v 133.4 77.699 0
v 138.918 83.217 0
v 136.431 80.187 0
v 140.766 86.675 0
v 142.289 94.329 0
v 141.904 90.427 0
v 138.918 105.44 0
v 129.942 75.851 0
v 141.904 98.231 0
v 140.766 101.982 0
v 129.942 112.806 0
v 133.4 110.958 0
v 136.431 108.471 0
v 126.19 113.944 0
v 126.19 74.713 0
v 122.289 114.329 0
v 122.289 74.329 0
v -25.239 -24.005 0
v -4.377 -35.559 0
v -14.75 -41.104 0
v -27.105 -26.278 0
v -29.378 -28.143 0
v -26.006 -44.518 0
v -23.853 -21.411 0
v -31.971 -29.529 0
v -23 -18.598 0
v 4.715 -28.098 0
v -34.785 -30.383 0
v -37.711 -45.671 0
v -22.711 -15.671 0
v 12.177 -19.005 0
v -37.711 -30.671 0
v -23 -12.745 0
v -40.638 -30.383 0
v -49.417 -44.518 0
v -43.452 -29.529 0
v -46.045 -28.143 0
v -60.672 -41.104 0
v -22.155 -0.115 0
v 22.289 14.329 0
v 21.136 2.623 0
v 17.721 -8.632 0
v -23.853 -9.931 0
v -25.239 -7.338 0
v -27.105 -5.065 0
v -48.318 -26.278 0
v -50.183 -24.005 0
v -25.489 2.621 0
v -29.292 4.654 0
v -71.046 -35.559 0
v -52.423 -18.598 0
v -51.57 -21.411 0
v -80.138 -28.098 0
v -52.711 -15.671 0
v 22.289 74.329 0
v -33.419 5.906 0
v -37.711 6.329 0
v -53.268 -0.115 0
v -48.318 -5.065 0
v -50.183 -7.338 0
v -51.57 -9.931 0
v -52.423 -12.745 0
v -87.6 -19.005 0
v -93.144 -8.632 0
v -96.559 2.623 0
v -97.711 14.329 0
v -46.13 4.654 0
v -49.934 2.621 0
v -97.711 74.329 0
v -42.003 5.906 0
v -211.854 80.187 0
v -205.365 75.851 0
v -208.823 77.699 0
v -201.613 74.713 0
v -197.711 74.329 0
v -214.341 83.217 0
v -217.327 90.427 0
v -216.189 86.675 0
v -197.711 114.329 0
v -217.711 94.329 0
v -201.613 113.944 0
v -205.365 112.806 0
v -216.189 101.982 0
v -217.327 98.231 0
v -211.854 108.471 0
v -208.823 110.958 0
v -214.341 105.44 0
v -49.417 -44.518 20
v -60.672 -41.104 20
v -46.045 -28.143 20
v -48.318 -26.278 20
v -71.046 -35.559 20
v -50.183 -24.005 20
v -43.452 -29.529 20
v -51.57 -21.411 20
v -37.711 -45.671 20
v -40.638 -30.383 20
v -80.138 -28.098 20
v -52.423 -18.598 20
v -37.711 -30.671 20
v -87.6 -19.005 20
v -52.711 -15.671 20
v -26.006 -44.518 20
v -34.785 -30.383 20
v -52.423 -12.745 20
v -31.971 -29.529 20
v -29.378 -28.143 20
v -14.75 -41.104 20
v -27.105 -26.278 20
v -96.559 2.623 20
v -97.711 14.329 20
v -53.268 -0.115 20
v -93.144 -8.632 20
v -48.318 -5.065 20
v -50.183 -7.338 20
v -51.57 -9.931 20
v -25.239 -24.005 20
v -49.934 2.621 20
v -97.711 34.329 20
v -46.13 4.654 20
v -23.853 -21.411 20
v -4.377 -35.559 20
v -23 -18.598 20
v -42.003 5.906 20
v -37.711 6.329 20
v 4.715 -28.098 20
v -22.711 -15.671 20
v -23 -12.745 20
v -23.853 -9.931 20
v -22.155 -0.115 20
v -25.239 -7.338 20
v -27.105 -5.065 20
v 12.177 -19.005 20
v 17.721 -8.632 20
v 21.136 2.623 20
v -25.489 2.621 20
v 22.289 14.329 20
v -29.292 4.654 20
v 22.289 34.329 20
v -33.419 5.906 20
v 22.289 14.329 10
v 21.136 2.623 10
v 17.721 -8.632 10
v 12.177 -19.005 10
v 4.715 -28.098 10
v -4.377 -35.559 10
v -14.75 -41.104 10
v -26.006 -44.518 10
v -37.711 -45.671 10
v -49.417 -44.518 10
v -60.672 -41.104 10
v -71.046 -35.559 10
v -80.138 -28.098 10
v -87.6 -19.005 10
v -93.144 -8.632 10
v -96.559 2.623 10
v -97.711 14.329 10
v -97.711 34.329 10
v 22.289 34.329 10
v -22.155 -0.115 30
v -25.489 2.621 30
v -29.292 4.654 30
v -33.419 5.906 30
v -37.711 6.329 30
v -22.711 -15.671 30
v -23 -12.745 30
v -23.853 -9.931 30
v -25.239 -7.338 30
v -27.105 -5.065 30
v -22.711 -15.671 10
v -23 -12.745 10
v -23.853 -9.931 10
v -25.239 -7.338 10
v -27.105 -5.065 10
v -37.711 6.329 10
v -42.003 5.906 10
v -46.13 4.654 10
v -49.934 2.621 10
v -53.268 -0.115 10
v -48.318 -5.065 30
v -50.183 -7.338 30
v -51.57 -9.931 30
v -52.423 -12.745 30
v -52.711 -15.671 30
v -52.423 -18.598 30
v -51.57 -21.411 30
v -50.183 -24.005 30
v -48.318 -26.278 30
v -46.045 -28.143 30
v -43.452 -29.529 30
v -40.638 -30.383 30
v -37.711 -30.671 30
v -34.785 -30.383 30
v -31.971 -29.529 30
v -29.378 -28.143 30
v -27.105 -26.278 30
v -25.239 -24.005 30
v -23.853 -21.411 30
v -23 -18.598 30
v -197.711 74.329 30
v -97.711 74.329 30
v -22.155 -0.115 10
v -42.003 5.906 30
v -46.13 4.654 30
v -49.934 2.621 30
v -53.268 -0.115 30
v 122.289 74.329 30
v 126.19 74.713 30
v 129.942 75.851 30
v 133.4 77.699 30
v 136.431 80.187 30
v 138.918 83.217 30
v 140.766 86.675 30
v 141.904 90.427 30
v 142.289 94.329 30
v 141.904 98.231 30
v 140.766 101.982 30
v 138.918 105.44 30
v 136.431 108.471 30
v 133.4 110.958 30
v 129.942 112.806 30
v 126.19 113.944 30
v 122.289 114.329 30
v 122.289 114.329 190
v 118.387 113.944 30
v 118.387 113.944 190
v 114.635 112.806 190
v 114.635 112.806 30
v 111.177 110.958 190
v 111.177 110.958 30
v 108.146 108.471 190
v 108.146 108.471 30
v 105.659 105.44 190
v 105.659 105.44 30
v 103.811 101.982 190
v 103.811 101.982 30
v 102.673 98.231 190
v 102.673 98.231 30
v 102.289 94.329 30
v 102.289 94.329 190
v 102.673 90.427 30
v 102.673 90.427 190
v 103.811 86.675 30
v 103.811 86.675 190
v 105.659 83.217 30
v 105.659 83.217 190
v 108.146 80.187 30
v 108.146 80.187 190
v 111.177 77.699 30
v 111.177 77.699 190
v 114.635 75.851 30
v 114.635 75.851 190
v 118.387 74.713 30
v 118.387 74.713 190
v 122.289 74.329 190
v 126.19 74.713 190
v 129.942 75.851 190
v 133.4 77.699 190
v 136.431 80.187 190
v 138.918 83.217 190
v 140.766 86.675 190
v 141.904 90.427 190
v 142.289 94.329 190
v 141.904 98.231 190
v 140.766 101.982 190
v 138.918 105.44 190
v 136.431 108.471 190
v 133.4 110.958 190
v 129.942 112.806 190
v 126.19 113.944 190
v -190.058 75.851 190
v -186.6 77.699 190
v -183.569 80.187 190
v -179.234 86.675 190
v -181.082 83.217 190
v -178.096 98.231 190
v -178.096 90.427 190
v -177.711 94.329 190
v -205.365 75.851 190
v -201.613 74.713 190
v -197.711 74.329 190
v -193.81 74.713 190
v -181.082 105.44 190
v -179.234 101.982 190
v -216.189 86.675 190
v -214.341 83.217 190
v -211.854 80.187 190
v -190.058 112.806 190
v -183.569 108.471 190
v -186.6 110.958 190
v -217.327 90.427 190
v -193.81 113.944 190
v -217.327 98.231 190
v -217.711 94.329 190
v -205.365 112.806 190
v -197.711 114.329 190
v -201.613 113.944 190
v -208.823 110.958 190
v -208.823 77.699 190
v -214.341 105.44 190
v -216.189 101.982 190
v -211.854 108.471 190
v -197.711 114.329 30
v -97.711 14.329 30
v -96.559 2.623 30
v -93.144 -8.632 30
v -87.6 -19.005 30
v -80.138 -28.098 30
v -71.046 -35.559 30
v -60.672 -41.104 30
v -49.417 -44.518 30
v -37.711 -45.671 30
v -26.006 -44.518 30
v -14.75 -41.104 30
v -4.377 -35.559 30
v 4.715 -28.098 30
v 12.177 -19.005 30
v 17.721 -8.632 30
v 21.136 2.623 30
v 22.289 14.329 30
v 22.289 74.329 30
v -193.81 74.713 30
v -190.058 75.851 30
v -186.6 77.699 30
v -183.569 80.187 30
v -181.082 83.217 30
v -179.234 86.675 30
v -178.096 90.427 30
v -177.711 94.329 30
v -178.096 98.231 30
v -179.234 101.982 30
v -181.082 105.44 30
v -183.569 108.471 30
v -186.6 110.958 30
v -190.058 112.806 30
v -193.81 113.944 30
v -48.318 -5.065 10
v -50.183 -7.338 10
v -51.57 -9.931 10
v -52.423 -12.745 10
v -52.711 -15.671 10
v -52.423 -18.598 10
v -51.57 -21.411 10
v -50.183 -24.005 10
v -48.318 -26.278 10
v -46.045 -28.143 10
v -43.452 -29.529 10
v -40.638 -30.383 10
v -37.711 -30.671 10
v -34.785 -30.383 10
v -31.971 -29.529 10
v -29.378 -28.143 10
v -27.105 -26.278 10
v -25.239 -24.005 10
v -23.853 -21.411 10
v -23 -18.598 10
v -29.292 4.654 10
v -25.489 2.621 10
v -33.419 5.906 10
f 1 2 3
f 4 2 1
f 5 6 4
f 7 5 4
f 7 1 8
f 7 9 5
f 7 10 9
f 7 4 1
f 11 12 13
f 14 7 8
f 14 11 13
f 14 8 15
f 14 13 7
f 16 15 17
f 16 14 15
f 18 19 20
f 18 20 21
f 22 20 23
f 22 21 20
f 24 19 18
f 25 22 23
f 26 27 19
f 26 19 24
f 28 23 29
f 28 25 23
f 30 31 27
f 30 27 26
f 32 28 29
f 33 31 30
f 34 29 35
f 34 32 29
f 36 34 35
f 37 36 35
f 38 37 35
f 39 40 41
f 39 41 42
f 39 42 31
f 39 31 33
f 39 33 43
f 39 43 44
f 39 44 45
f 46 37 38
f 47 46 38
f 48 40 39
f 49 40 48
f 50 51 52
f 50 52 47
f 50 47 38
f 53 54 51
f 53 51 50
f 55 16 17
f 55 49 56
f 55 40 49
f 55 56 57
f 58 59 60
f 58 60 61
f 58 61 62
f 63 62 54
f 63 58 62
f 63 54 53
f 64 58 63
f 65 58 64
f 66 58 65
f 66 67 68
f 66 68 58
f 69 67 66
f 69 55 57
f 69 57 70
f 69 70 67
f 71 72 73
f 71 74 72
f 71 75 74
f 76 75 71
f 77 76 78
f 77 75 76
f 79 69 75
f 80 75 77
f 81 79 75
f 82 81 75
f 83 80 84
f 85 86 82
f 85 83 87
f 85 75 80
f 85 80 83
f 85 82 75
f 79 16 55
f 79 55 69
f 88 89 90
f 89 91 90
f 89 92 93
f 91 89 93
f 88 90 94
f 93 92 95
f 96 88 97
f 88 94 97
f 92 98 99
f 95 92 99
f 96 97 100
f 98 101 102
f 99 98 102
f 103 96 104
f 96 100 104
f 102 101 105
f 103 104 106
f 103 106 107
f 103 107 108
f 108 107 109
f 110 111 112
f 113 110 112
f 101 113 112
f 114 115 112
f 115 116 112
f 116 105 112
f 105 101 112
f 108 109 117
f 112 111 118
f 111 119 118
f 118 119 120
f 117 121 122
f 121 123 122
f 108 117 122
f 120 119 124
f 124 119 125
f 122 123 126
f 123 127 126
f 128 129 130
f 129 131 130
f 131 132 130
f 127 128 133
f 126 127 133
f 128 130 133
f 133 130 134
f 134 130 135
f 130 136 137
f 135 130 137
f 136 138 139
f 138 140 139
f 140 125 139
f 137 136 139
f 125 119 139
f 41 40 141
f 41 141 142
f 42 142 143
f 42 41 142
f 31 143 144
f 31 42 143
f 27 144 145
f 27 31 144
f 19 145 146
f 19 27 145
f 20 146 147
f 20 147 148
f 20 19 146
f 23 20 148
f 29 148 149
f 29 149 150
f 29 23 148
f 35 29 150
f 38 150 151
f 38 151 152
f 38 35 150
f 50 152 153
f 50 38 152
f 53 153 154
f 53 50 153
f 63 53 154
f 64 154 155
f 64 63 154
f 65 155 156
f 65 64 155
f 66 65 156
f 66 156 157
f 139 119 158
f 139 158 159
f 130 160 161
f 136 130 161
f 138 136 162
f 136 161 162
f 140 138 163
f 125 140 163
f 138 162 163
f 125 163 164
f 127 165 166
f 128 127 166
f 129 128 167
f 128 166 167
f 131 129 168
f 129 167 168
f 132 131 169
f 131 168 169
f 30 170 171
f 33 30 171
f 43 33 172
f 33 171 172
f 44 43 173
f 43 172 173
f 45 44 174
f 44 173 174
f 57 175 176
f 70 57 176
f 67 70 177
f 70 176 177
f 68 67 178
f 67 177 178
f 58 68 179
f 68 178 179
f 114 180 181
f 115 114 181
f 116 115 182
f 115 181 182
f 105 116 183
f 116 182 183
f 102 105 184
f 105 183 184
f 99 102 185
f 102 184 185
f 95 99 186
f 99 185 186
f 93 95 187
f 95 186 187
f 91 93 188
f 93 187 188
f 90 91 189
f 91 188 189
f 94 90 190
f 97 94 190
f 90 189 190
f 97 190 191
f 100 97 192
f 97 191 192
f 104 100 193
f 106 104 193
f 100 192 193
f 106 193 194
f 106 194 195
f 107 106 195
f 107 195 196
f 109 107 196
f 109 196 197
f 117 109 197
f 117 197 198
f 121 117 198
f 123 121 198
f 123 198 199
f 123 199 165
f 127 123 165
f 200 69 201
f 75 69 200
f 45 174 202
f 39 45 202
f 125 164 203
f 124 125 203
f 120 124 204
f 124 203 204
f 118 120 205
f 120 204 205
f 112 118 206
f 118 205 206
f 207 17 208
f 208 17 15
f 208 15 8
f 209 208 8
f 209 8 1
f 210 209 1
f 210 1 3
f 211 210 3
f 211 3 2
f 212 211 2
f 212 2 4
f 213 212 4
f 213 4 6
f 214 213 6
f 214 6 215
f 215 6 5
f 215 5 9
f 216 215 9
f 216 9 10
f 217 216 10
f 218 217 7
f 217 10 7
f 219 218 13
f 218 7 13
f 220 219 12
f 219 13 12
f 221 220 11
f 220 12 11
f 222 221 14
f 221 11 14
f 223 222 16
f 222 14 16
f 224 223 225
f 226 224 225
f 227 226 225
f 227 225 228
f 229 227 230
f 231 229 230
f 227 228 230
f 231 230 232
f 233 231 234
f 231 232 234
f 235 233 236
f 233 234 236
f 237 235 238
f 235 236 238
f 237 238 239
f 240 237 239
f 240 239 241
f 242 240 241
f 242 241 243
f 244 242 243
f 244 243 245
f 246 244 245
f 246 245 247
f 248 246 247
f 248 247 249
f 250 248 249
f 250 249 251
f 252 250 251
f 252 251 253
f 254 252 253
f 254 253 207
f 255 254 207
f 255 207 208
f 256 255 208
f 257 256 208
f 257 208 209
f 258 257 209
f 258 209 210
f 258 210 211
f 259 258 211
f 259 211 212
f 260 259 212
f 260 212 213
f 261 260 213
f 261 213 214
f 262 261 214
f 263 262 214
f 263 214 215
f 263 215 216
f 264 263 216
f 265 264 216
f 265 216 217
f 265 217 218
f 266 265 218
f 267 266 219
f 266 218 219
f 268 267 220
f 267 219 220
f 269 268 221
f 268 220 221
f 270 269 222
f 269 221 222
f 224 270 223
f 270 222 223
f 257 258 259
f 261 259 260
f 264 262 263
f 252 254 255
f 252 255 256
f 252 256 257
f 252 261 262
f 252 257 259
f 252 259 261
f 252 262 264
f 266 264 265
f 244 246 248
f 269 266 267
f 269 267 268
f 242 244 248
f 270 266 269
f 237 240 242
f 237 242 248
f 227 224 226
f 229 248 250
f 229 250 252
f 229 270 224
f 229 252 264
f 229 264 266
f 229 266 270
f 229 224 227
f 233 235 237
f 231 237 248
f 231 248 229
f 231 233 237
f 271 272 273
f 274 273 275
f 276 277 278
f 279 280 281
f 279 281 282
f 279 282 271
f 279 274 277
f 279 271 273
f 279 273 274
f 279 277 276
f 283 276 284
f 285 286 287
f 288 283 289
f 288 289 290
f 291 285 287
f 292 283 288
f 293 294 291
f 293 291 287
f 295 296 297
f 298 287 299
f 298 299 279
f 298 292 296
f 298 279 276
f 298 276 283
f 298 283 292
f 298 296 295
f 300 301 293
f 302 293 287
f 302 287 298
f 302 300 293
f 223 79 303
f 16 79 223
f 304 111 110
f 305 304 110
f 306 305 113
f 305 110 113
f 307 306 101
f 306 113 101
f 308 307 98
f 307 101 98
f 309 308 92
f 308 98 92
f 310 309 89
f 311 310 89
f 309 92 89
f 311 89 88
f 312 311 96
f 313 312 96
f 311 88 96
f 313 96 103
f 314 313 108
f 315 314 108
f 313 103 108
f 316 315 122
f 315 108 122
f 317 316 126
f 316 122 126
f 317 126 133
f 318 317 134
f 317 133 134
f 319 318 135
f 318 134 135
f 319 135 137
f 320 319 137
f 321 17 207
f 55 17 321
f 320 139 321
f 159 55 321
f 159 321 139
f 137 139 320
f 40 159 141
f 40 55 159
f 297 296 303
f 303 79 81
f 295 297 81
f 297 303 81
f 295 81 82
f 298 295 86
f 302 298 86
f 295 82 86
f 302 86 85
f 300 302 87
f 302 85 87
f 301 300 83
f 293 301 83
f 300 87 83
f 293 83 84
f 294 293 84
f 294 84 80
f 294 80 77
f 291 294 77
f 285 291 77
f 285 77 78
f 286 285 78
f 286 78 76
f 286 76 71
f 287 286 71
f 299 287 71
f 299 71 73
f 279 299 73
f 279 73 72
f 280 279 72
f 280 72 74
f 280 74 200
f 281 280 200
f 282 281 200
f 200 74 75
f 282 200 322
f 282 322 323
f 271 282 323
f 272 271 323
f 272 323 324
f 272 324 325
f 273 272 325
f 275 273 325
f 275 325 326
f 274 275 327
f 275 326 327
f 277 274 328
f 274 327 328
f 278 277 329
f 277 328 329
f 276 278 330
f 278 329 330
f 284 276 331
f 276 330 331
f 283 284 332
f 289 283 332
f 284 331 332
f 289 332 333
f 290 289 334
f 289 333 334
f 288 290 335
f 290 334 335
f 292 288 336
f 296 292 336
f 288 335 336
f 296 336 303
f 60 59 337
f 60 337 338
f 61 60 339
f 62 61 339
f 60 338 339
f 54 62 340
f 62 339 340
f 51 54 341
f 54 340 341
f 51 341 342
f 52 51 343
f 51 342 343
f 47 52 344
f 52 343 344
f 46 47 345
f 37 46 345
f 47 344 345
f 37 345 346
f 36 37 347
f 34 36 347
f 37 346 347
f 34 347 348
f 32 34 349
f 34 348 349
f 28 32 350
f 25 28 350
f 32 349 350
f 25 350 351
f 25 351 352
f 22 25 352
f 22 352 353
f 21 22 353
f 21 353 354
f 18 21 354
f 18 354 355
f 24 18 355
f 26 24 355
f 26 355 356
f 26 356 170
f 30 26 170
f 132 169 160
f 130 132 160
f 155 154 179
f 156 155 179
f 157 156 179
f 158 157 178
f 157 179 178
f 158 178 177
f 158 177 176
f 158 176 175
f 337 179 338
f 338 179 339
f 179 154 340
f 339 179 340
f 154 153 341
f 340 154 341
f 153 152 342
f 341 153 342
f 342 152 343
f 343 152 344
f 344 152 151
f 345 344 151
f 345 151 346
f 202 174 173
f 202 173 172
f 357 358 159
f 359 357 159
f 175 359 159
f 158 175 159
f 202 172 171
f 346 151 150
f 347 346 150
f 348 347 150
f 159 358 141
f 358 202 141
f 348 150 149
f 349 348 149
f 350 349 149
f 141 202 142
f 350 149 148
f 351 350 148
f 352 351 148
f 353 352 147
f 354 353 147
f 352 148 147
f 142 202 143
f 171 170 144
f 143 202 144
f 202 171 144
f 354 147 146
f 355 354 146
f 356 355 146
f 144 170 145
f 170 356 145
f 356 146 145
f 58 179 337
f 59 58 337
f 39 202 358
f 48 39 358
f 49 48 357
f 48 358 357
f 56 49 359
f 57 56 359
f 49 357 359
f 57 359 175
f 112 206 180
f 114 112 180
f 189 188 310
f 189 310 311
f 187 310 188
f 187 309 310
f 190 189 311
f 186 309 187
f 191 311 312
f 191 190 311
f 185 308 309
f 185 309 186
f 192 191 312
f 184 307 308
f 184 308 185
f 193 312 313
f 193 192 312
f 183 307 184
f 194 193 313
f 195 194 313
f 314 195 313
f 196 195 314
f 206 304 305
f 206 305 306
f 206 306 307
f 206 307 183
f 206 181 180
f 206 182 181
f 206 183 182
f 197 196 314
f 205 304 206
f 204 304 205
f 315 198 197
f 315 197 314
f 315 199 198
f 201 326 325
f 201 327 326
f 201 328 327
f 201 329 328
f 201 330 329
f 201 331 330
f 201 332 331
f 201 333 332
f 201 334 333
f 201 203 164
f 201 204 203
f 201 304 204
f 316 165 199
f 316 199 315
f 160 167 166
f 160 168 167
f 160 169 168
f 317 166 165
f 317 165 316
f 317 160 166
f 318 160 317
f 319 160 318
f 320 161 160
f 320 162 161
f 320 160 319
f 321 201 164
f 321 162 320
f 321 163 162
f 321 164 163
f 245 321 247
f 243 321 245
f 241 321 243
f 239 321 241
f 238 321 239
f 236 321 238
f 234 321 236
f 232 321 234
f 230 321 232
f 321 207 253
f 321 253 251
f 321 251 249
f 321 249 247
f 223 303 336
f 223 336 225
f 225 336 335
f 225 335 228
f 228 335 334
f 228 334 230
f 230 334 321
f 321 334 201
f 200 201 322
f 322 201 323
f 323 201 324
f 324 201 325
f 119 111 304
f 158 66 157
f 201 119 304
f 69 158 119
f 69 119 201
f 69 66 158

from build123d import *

# Parameters (mm, degrees)
SKETCH_1_R          = 20
EXTRUDE_1_DEPTH     = 30
EXTRUDE_2_DEPTH     = 10
EXTRUDE_START       = -10
EXTRUDE_3_DEPTH     = 10
CUT_EXTRUDE_1_DEPTH = 30
SKETCH_6_W          = 120
SKETCH_6_H          = 10
CUT_EXTRUDE_2_DEPTH = 20
SKETCH_7_R          = 20
EXTRUDE_4_DEPTH     = 160


with BuildPart() as part:
    # 草图1 → 凸台-拉伸1 (new body)
    with BuildSketch(Plane.XY):
        with Locations((-197.711448945, 94.32879439)):
            Circle(SKETCH_1_R)
        with Locations((122.288551055, 94.32879439)):
            Circle(SKETCH_1_R)
        Polygon((-197.711448945, 114.32879439), (122.288551055, 114.32879439), (122.288551055, 74.32879439), (22.288551055, 74.32879439), (22.288551055, 14.32879439), (-97.711448945, 14.32879439), (-97.711448945, 74.32879439), (-197.711448945, 74.32879439), align=None)
    extrude(amount=EXTRUDE_1_DEPTH)

    # 草图3 → 凸台-拉伸2 (add)
    with BuildSketch(Plane(origin=(0, 0, 0), x_dir=(-1, 0, 0), z_dir=(0, 0, -1))):
        with BuildLine():
            ThreePointArc((97.711448945, 14.32879439), (37.711448945, 74.32879439), (-22.288551055, 14.32879439))
            Line((-22.288551055, 14.32879439), (97.711448945, 14.32879439))
        make_face()
        with BuildLine():
            Line((97.711448945, 14.32879439), (-22.288551055, 14.32879439))
            ThreePointArc((-22.288551055, 14.32879439), (37.711448945, -45.67120561), (97.711448945, 14.32879439))
        make_face()
    extrude(amount=-EXTRUDE_2_DEPTH)

    # 草图4 → 凸台-拉伸3 (add)
    with BuildSketch(Plane.XY.offset(30).offset(EXTRUDE_START)):
        with BuildLine():
            ThreePointArc((22.288551055, 14.32879439), (-37.711448945, 74.32879439), (-97.711448945, 14.32879439))
            Line((-97.711448945, 14.32879439), (22.288551055, 14.32879439))
        make_face()
        with BuildLine():
            Line((22.288551055, 14.32879439), (-97.711448945, 14.32879439))
            ThreePointArc((-97.711448945, 14.32879439), (-37.711448945, -45.67120561), (22.288551055, 14.32879439))
        make_face()
    extrude(amount=EXTRUDE_3_DEPTH)

    # 草图5 → 切除-拉伸1 (cut)
    with BuildSketch(Plane.XY.offset(30)):
        with BuildLine():
            ThreePointArc((-37.711448945, 6.32879439), (-46.130484457, 4.654144105), (-53.267798131, -0.114856424))
            Line((-53.267798131, -0.114856424), (-48.318050663, -5.064603892))
            ThreePointArc((-48.318050663, -5.064603892), (-43.45170043, -1.813012622), (-37.711448945, -0.67120561))
            Line((-37.711448945, -0.67120561), (-37.711448945, 6.32879439))
        make_face()
        with BuildLine():
            ThreePointArc((-22.155099759, -0.114856424), (-29.292413433, 4.654144105), (-37.711448945, 6.32879439))
            Line((-37.711448945, 6.32879439), (-37.711448945, -0.67120561))
            ThreePointArc((-37.711448945, -0.67120561), (-31.971197459, -1.813012622), (-27.104847227, -5.064603892))
            Line((-27.104847227, -5.064603892), (-22.155099759, -0.114856424))
        make_face()
        with BuildLine():
            ThreePointArc((-27.104847227, -5.064603892), (-31.971197459, -1.813012622), (-37.711448945, -0.67120561))
            Line((-37.711448945, -0.67120561), (-37.711448945, -15.67120561))
            Line((-37.711448945, -15.67120561), (-27.104847227, -5.064603892))
        make_face()
        with BuildLine():
            ThreePointArc((-37.711448945, -0.67120561), (-43.45170043, -1.813012622), (-48.318050663, -5.064603892))
            Line((-48.318050663, -5.064603892), (-37.711448945, -15.67120561))
            Line((-37.711448945, -15.67120561), (-37.711448945, -0.67120561))
        make_face()
        with BuildLine():
            Line((-37.711448945, -15.67120561), (-48.318050663, -5.064603892))
            ThreePointArc((-48.318050663, -5.064603892), (-43.45170043, -29.529398598), (-22.711448945, -15.67120561))
            ThreePointArc((-22.711448945, -15.67120561), (-23.853255957, -9.930954125), (-27.104847227, -5.064603892))
            Line((-27.104847227, -5.064603892), (-37.711448945, -15.67120561))
        make_face()
    extrude(amount=-CUT_EXTRUDE_1_DEPTH, mode=Mode.SUBTRACT)

    # 草图6 → 切除-拉伸2 (cut)
    with BuildSketch(Plane.XZ.offset(-14.32879439)):
        with Locations((-37.711448945, 15)):
            Rectangle(SKETCH_6_W, SKETCH_6_H)
    extrude(amount=-CUT_EXTRUDE_2_DEPTH, mode=Mode.SUBTRACT)

    # 草图7 → 凸台-拉伸4 (add)
    with BuildSketch(Plane.XY.offset(30)):
        with Locations(Location((-197.711448945, 94.32879439, 0), (0, 0, 90))):
            Circle(SKETCH_7_R)
        with Locations(Location((122.288551055, 94.32879439, 0), (0, 0, 90))):
            Circle(SKETCH_7_R)
    extrude(amount=EXTRUDE_4_DEPTH)


solid = part.part
